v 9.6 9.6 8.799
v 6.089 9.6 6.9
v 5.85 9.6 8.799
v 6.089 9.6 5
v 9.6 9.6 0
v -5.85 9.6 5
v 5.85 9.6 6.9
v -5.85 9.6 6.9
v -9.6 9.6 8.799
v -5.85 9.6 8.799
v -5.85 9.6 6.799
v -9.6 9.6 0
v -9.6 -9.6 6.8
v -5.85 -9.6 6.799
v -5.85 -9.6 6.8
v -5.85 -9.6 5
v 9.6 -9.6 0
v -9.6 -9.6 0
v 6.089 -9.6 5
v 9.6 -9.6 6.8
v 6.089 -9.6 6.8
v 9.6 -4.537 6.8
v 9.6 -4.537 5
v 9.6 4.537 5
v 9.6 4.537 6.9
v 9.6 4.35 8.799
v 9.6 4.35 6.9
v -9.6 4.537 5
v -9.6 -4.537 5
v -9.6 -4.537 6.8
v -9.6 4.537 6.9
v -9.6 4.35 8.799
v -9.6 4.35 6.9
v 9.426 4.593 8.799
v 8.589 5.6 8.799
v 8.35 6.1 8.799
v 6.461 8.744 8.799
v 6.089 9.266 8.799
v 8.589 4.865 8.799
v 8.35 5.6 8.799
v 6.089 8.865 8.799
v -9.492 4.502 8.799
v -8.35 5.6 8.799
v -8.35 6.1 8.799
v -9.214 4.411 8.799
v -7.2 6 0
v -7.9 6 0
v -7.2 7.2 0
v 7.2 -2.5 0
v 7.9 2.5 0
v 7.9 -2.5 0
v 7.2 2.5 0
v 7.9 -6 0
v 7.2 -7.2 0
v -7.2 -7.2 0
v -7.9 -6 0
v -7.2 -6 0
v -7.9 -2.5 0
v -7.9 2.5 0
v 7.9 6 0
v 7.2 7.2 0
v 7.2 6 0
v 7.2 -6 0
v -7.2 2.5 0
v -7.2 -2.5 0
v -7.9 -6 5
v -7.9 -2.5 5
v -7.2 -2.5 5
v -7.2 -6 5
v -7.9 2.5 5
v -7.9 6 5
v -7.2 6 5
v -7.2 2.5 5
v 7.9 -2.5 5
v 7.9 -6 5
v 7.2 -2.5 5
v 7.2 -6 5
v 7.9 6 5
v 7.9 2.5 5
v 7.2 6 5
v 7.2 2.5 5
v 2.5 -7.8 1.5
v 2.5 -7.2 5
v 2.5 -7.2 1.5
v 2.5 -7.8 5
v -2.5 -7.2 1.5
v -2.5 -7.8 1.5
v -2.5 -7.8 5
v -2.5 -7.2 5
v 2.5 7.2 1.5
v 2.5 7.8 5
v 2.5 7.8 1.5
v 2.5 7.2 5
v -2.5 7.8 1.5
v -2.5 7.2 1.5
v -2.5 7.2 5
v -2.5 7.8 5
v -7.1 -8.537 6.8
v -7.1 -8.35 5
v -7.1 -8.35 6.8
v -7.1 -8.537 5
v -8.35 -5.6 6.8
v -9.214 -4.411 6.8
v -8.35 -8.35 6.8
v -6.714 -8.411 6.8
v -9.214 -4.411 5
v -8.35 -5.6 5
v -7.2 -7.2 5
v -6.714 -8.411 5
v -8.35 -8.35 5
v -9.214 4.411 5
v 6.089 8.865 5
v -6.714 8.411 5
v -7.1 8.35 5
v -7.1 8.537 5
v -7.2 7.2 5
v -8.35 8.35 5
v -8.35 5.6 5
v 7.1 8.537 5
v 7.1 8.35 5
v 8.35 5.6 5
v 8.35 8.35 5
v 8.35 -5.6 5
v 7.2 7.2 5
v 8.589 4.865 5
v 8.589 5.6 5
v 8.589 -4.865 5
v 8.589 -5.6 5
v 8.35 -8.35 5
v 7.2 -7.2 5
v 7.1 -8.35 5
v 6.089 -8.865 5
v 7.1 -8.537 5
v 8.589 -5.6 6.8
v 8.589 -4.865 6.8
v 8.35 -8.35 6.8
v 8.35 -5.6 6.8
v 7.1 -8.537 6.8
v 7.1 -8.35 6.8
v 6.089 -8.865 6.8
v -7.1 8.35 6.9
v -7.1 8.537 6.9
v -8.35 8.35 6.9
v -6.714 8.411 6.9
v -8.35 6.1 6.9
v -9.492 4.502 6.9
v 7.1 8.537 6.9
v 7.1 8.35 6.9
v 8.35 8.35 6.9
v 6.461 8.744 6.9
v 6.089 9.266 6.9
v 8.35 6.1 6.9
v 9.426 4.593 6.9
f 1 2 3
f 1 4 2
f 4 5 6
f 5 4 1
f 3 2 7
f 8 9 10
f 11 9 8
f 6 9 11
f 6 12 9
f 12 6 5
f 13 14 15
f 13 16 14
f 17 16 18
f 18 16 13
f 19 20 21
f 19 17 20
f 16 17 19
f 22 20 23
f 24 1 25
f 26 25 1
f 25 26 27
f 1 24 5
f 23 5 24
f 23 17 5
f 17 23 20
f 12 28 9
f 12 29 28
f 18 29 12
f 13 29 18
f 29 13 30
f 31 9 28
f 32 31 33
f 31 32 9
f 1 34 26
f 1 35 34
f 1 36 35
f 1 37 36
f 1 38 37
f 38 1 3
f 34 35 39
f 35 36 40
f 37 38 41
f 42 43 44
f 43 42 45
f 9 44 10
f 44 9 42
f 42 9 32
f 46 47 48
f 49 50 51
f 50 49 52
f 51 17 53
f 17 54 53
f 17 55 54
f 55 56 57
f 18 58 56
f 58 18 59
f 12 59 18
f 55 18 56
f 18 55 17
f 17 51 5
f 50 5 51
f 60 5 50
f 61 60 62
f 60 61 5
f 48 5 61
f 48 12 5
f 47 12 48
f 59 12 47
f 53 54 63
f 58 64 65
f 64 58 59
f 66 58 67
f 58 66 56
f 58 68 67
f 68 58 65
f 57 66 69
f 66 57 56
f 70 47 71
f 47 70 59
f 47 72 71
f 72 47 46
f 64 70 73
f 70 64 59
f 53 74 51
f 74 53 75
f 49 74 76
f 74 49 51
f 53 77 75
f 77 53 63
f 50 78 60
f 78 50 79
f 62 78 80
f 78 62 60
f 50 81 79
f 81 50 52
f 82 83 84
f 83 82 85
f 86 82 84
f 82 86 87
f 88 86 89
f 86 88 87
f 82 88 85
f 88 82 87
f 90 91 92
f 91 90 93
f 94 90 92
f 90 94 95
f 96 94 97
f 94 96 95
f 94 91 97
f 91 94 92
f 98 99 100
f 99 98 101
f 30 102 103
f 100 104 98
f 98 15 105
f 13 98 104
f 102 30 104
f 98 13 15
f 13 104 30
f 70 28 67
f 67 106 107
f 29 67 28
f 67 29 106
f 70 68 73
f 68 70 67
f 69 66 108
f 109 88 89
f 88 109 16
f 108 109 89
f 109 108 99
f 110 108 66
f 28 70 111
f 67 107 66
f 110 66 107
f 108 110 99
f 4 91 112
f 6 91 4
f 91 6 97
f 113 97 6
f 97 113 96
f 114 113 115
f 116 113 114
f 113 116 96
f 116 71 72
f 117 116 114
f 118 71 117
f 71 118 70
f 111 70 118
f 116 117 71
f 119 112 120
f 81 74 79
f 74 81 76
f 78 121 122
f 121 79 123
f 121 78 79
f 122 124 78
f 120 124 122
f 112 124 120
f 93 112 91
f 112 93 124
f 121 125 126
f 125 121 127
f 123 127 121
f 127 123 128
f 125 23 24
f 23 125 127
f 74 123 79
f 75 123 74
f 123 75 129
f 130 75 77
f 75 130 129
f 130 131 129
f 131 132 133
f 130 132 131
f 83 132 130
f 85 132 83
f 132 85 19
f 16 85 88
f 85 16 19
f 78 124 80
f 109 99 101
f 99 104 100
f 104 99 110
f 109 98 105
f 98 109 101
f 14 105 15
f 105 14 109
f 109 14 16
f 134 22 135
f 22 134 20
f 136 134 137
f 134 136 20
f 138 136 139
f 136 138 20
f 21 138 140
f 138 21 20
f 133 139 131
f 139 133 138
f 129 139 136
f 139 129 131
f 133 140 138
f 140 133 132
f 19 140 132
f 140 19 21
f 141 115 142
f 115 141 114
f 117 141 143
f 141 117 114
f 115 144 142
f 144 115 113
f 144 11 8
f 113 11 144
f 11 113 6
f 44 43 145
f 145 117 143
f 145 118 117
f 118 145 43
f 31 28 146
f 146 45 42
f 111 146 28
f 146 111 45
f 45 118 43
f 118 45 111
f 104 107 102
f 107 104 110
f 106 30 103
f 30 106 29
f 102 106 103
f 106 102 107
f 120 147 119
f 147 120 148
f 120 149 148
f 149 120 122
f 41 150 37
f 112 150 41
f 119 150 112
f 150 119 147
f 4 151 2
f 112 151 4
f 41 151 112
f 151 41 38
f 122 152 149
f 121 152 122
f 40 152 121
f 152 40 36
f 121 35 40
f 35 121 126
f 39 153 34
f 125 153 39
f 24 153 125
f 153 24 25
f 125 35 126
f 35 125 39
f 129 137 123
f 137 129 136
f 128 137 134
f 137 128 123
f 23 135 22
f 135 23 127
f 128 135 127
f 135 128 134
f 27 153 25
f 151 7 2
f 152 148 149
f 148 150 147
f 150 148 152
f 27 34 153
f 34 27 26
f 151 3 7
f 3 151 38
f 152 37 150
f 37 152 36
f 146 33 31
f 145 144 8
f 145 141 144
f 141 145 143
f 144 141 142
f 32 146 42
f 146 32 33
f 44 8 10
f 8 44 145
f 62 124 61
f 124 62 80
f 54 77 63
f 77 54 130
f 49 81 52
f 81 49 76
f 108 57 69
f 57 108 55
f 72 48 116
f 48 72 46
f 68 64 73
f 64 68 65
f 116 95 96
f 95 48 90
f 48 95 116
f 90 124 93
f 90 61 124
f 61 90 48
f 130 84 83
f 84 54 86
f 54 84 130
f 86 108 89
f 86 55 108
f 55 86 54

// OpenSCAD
group() {
	difference() {
		group() {
			multmatrix([[1, 0, 0, 0], [0, 1, 0, 0], [0, 0, 1, 4.4], [0, 0, 0, 1]]) {
				cube(size = [19.2, 19.2, 8.8], center = true);
			}
		}
		group() {
			multmatrix([[1, 0, 0, 0], [0, 1, 0, 0], [0, 0, 1, 8.7995], [0, 0, 0, 1]]) {
				union() {
					cube(size = [19.2, 19.2, 0.001], center = true);
					multmatrix([[1, 0, 0, 0], [0, 1, 0, 0], [0, 0, 1, -1], [0, 0, 0, 1]]) {
						union() {
							cube(size = [11.7, 19.2, 2.001], center = true);
							cube(size = [19.2, 8.7, 2.001], center = true);
						}
					}
				}
			}
			multmatrix([[1, 0, 0, 0], [0, 1, 0, 0], [0, 0, 1, 3.4], [0, 0, 0, 1]]) {
				cube(size = [14.4, 14.4, 6.8], center = true);
			}
			group() {
				group() {
					group() {
						multmatrix([[1, 0, 0, -7.5], [0, 1, 0, -4.25], [0, 0, 1, 3.4], [0, 0, 0, 1]]) {
							cube(size = [0.8, 3.5, 6.8], center = true);
						}
						multmatrix([[1, 0, 0, -7.5], [0, 1, 0, 4.25], [0, 0, 1, 3.4], [0, 0, 0, 1]]) {
							cube(size = [0.8, 3.5, 6.8], center = true);
						}
					}
					group() {
						multmatrix([[1, 0, 0, 7.5], [0, 1, 0, -4.25], [0, 0, 1, 3.4], [0, 0, 0, 1]]) {
							cube(size = [0.8, 3.5, 6.8], center = true);
						}
						multmatrix([[1, 0, 0, 7.5], [0, 1, 0, 4.25], [0, 0, 1, 3.4], [0, 0, 0, 1]]) {
							cube(size = [0.8, 3.5, 6.8], center = true);
						}
					}
				}
			}
			group() {
				multmatrix([[1, 0, 0, 0], [0, 1, 0, -7.1], [0, 0, 1, 4.15], [0, 0, 0, 1]]) {
					cube(size = [5, 1.4, 5.3], center = true);
				}
				multmatrix([[1, 0, 0, 0], [0, 1, 0, 7.1], [0, 0, 1, 4.15], [0, 0, 0, 1]]) {
					cube(size = [5, 1.4, 5.3], center = true);
				}
			}
			multmatrix([[1, 0, 0, 0], [0, 1, 0, 0], [0, 0, 1, 6.9], [0, 0, 0, 1]]) {
				difference() {
					cube(size = [19.2, 19.2, 3.8], center = true);
					union() {
						group() {
							multmatrix([[1, 0, 0, -8.35], [0, 1, 0, 8.975], [0, 0, 1, 0], [0, 0, 0, 1]]) {
								cube(size = [2.5, 1.25, 3.8], center = true);
							}
							multmatrix([[1, 0, 0, -7.1], [0, 1, 0, 9.6], [0, 0, 1, -1.9], [0, 0, 0, 1]]) {
								cylinder($fn = 0, $fa = 12, $fs = 2, h = 3.8, r1 = 1.25, r2 = 1.25, center = false);
							}
							group() {
								multmatrix([[1, 0, 0, -8.35], [0, 1, 0, -8.975], [0, 0, 1, -1], [0, 0, 0, 1]]) {
									cube(size = [2.5, 1.25, 1.8], center = true);
								}
								multmatrix([[1, 0, 0, -7.1], [0, 1, 0, -9.6], [0, 0, 1, -1.9], [0, 0, 0, 1]]) {
									cylinder($fn = 0, $fa = 12, $fs = 2, h = 1.8, r1 = 1.25, r2 = 1.25, center = false);
								}
							}
							multmatrix([[1, 0, 0, -8.975], [0, 1, 0, 7.6], [0, 0, 1, 0], [0, 0, 0, 1]]) {
								cube(size = [1.25, 4, 3.8], center = true);
							}
							multmatrix([[1, 0, 0, -9.6], [0, 1, 0, 5.6], [0, 0, 1, -1.9], [0, 0, 0, 1]]) {
								cylinder($fn = 0, $fa = 12, $fs = 2, h = 3.8, r1 = 1.25, r2 = 1.25, center = false);
							}
							multmatrix([[1, 0, 0, -8.975], [0, 1, 0, -7.6], [0, 0, 1, -1], [0, 0, 0, 1]]) {
								cube(size = [1.25, 4, 1.8], center = true);
							}
							multmatrix([[1, 0, 0, -9.6], [0, 1, 0, -5.6], [0, 0, 1, -1.9], [0, 0, 0, 1]]) {
								cylinder($fn = 0, $fa = 12, $fs = 2, h = 1.8, r1 = 1.25, r2 = 1.25, center = false);
							}
							multmatrix([[1, 0, 0, 8.35], [0, 1, 0, 8.975], [0, 0, 1, 0], [0, 0, 0, 1]]) {
								cube(size = [2.5, 1.25, 3.8], center = true);
							}
							multmatrix([[1, 0, 0, 7.1], [0, 1, 0, 9.6], [0, 0, 1, -1.9], [0, 0, 0, 1]]) {
								cylinder($fn = 0, $fa = 12, $fs = 2, h = 3.8, r1 = 1.25, r2 = 1.25, center = false);
							}
							group() {
								multmatrix([[1, 0, 0, 8.35], [0, 1, 0, -8.975], [0, 0, 1, -1], [0, 0, 0, 1]]) {
									cube(size = [2.5, 1.25, 1.8], center = true);
								}
								multmatrix([[1, 0, 0, 7.1], [0, 1, 0, -9.6], [0, 0, 1, -1.9], [0, 0, 0, 1]]) {
									cylinder($fn = 0, $fa = 12, $fs = 2, h = 1.8, r1 = 1.25, r2 = 1.25, center = false);
								}
							}
							multmatrix([[1, 0, 0, 8.975], [0, 1, 0, 7.6], [0, 0, 1, 0], [0, 0, 0, 1]]) {
								cube(size = [1.25, 4, 3.8], center = true);
							}
							multmatrix([[1, 0, 0, 9.6], [0, 1, 0, 5.6], [0, 0, 1, -1.9], [0, 0, 0, 1]]) {
								cylinder($fn = 0, $fa = 12, $fs = 2, h = 3.8, r1 = 1.25, r2 = 1.25, center = false);
							}
							multmatrix([[1, 0, 0, 8.975], [0, 1, 0, -7.6], [0, 0, 1, -1], [0, 0, 0, 1]]) {
								cube(size = [1.25, 4, 1.8], center = true);
							}
							multmatrix([[1, 0, 0, 9.6], [0, 1, 0, -5.6], [0, 0, 1, -1.9], [0, 0, 0, 1]]) {
								cylinder($fn = 0, $fa = 12, $fs = 2, h = 1.8, r1 = 1.25, r2 = 1.25, center = false);
							}
						}
						group() {
							multmatrix([[1, 0, 0, 9.6], [0, 1, 0, 9.6], [0, 0, 1, 0], [0, 0, 0, 1]]) {
								multmatrix([[-1, 0, 0, 0], [-0, -1, 0, 0], [-0, 0, 1, 0], [0, 0, 0, 1]]) {
									group() {
										polyhedron(points = [[0, 0, 0], [3.75, 0, 0], [0, 5.25, 0], [0, 0, 2], [3.75, 0, 2], [0, 5.25, 2]], faces = [[0, 1, 2], [0, 3, 4, 1], [0, 2, 5, 3], [1, 4, 5, 2], [3, 5, 4]], convexity = 1);
									}
								}
							}
							multmatrix([[1, 0, 0, -9.6], [0, 1, 0, 9.6], [0, 0, 1, 2], [0, 0, 0, 1]]) {
								multmatrix([[1, 0, 0, 0], [0, -1, 0, 0], [0, 0, -1, 0], [0, 0, 0, 1]]) {
									group() {
										polyhedron(points = [[0, 0, 0], [3.75, 0, 0], [0, 5.25, 0], [0, 0, 2], [3.75, 0, 2], [0, 5.25, 2]], faces = [[0, 1, 2], [0, 3, 4, 1], [0, 2, 5, 3], [1, 4, 5, 2], [3, 5, 4]], convexity = 1);
									}
								}
							}
						}
					}
				}
			}
		}
	}
}
